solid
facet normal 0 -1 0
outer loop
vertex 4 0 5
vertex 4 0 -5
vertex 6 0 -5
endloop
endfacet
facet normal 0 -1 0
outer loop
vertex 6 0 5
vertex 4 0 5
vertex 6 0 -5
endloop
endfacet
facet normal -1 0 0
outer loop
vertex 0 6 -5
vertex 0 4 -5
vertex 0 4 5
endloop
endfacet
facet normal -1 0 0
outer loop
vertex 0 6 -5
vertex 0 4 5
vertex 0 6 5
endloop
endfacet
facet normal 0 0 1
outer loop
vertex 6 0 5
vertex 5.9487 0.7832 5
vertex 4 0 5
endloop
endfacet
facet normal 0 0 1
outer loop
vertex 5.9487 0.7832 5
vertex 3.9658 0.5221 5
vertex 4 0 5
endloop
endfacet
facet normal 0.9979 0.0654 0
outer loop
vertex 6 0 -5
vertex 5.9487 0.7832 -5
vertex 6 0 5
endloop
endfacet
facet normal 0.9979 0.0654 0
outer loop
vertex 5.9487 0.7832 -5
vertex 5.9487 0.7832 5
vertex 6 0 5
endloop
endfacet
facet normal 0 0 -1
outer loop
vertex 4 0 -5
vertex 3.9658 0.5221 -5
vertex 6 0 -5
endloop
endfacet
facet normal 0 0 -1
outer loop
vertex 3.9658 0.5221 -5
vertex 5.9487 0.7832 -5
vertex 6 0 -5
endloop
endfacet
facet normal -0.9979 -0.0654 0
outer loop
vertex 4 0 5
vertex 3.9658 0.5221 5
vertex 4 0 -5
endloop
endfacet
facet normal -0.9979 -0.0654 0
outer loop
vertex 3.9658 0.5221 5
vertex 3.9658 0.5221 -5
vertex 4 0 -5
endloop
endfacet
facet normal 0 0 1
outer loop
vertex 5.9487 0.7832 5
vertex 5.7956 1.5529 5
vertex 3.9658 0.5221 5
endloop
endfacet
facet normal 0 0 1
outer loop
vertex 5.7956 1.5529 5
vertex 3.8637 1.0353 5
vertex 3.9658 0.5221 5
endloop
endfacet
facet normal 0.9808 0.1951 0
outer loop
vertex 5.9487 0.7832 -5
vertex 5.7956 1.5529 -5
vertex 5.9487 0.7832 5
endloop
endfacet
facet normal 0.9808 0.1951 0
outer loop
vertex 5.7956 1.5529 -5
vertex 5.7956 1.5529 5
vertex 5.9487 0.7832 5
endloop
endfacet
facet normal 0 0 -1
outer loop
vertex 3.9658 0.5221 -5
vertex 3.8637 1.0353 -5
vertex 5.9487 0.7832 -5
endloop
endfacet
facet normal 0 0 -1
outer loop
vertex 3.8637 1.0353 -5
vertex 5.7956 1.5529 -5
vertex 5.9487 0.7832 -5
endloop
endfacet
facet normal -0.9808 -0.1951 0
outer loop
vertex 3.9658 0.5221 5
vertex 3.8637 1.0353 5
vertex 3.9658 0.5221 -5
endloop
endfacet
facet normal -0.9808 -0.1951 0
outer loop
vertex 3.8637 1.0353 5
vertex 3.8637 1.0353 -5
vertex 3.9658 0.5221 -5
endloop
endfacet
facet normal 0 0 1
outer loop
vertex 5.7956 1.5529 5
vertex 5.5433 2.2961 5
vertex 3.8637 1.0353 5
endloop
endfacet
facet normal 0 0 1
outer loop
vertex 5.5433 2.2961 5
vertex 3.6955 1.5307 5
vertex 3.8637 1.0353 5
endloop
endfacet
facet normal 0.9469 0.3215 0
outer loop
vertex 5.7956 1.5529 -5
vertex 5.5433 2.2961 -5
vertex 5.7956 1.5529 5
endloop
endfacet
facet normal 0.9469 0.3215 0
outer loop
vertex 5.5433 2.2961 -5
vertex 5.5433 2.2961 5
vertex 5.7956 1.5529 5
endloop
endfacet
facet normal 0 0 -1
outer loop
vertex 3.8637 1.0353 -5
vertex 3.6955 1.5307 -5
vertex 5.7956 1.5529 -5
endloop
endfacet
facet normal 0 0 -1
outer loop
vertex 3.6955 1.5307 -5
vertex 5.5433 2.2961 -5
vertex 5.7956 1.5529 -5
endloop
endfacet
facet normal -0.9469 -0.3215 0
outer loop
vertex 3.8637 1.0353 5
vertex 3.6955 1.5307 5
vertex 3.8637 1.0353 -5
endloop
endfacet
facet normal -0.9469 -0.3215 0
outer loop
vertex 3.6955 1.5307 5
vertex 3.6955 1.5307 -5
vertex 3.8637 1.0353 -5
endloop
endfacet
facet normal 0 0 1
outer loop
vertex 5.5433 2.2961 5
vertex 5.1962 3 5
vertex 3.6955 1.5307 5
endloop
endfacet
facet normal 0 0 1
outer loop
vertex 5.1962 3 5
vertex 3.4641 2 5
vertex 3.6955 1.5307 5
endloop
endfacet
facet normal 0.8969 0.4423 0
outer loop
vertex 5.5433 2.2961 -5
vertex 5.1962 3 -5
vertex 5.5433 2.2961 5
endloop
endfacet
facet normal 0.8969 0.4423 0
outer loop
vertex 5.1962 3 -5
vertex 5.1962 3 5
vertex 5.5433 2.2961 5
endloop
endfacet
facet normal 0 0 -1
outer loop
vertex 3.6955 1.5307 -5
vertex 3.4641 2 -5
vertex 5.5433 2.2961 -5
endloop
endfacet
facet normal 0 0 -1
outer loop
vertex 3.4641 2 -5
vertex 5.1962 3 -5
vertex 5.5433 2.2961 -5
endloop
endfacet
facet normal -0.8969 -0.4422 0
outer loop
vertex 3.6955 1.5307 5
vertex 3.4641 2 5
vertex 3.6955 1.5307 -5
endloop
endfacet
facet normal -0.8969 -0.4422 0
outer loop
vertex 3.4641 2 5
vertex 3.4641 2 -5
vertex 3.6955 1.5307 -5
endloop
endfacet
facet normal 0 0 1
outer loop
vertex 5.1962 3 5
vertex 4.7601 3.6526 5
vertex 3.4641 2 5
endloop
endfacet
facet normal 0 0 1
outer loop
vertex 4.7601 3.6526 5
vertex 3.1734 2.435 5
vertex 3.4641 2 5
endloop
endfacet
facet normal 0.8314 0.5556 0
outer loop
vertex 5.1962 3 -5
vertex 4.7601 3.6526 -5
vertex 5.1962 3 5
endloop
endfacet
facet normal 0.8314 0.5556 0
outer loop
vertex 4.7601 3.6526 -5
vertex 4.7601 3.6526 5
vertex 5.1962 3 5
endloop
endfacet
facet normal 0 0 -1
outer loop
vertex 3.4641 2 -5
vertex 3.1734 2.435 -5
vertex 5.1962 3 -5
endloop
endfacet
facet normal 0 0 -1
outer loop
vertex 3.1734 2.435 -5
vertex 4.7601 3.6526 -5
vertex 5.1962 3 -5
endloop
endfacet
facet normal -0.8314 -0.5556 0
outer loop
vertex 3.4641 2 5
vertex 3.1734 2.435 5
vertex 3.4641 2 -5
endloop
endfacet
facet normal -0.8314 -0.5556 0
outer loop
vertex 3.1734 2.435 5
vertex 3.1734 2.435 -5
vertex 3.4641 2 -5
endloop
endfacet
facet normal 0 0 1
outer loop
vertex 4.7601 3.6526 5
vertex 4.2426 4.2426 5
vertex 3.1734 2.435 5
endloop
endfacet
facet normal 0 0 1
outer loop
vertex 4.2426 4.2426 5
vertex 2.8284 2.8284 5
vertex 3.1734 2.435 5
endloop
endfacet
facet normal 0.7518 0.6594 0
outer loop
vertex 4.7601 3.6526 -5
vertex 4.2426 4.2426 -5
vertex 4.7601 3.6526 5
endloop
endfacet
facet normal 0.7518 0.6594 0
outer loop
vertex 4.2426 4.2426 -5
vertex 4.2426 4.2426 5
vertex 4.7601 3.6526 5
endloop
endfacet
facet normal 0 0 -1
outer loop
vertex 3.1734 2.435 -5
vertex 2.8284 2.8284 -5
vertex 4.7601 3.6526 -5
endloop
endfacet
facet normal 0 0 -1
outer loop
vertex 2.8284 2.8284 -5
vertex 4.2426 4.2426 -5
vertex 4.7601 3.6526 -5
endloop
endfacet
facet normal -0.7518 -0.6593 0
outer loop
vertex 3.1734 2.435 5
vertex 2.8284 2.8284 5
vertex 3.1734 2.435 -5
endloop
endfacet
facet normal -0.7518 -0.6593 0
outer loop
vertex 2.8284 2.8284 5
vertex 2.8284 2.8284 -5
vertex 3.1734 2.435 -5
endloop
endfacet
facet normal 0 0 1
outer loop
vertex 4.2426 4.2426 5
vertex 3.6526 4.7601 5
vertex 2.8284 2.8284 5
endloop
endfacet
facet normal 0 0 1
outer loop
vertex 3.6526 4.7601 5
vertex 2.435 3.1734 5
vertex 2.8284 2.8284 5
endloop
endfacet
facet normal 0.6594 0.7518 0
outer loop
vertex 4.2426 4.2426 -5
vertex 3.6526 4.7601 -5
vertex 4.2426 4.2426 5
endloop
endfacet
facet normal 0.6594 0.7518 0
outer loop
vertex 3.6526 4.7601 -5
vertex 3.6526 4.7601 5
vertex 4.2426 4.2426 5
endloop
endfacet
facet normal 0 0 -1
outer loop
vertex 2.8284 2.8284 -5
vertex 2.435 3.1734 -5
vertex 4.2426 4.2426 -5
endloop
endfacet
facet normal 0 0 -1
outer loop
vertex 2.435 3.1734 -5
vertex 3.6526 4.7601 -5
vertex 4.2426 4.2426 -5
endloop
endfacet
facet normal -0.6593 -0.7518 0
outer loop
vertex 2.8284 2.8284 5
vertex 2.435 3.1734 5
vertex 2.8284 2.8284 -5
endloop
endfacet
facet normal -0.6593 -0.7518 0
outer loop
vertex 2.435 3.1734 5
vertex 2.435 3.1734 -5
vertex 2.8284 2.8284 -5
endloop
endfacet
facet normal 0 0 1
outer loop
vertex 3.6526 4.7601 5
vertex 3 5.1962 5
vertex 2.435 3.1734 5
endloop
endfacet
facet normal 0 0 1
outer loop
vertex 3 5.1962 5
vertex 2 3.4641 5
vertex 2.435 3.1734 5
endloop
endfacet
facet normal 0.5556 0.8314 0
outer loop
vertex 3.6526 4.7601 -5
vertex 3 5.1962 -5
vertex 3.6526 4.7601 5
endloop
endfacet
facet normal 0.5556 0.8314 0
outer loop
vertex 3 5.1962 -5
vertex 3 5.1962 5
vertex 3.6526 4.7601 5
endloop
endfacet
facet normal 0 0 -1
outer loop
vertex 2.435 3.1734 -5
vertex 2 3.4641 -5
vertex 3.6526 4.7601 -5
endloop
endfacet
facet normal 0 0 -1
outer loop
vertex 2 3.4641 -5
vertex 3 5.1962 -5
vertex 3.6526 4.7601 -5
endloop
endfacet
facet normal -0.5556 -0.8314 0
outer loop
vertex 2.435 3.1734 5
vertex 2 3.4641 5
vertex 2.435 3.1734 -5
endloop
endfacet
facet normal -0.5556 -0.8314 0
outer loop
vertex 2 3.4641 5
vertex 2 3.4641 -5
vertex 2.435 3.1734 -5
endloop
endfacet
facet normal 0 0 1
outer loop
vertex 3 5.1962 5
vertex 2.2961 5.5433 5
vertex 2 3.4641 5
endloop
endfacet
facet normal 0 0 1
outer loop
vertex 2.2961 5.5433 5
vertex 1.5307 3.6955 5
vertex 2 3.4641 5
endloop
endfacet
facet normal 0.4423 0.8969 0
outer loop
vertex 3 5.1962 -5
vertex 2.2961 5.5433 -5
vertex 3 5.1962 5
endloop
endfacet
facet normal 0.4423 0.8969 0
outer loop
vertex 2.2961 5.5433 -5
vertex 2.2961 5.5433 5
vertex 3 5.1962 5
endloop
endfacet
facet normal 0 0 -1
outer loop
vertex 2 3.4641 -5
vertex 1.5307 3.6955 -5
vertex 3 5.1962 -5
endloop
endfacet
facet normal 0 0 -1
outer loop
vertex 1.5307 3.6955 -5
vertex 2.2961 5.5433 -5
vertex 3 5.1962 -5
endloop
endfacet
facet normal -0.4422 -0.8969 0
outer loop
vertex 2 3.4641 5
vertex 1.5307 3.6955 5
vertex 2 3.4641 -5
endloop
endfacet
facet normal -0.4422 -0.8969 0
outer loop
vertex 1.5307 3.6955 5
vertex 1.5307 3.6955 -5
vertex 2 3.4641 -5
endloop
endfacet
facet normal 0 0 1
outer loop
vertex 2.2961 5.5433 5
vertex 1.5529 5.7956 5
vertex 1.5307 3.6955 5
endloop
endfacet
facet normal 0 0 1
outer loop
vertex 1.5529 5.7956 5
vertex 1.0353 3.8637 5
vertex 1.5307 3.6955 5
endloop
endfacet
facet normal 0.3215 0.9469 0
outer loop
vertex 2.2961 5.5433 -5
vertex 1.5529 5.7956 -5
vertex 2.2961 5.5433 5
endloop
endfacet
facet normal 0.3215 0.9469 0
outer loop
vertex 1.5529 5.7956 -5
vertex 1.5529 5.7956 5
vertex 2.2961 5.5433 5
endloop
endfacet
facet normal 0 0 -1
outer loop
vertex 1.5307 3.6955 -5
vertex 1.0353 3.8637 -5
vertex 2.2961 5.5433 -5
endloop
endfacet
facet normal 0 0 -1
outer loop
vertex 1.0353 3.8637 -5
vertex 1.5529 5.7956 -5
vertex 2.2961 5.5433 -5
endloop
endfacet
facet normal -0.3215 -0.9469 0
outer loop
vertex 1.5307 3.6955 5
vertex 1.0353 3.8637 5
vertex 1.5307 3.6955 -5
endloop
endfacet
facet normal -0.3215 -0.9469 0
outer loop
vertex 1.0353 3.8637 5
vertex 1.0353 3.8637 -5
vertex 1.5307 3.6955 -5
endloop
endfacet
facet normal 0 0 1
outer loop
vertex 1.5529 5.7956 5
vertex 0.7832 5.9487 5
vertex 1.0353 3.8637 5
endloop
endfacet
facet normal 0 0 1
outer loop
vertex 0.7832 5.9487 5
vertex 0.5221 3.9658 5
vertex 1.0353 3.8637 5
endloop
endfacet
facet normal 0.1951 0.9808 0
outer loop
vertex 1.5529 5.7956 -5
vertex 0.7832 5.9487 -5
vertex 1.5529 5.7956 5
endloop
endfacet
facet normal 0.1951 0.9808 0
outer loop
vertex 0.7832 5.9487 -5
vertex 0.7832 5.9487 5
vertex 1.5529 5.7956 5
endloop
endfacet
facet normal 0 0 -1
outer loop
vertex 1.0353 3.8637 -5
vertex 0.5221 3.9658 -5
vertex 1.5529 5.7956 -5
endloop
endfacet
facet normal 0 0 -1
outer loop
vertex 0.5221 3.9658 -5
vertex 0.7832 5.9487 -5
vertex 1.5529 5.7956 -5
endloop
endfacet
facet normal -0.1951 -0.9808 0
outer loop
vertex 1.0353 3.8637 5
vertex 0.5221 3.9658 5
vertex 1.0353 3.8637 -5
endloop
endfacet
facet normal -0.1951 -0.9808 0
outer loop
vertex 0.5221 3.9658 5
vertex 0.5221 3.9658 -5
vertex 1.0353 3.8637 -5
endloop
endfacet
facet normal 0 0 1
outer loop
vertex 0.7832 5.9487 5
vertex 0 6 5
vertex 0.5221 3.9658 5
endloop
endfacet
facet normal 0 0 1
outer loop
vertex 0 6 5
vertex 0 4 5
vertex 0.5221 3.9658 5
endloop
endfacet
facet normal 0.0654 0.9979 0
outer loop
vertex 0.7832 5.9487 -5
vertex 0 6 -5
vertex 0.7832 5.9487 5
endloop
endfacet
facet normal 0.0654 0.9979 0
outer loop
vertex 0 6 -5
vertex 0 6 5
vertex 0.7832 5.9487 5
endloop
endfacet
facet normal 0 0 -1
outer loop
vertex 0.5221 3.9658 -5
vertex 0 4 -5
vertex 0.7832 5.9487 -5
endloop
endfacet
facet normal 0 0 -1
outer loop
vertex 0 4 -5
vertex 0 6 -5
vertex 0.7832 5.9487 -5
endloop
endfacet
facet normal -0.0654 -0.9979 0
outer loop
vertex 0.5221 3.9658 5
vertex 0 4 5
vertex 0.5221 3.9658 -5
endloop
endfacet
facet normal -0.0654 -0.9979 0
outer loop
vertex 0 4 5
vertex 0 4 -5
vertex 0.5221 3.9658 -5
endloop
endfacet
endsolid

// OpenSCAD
$fn = 50;

// ok. this gives us a very precise control over final bend position.

// but the 90deg plane rotation is too complicated. 
// and cannot see that it is possible to unbend the shape with deformation.
 

rotate_extrude( angle=90)
translate([5,0,0])
square([2,10], center=true);


translate([5,0,0])
square([2,10], center=true);




translate([0,0,0])
square([2,10], center=true);
